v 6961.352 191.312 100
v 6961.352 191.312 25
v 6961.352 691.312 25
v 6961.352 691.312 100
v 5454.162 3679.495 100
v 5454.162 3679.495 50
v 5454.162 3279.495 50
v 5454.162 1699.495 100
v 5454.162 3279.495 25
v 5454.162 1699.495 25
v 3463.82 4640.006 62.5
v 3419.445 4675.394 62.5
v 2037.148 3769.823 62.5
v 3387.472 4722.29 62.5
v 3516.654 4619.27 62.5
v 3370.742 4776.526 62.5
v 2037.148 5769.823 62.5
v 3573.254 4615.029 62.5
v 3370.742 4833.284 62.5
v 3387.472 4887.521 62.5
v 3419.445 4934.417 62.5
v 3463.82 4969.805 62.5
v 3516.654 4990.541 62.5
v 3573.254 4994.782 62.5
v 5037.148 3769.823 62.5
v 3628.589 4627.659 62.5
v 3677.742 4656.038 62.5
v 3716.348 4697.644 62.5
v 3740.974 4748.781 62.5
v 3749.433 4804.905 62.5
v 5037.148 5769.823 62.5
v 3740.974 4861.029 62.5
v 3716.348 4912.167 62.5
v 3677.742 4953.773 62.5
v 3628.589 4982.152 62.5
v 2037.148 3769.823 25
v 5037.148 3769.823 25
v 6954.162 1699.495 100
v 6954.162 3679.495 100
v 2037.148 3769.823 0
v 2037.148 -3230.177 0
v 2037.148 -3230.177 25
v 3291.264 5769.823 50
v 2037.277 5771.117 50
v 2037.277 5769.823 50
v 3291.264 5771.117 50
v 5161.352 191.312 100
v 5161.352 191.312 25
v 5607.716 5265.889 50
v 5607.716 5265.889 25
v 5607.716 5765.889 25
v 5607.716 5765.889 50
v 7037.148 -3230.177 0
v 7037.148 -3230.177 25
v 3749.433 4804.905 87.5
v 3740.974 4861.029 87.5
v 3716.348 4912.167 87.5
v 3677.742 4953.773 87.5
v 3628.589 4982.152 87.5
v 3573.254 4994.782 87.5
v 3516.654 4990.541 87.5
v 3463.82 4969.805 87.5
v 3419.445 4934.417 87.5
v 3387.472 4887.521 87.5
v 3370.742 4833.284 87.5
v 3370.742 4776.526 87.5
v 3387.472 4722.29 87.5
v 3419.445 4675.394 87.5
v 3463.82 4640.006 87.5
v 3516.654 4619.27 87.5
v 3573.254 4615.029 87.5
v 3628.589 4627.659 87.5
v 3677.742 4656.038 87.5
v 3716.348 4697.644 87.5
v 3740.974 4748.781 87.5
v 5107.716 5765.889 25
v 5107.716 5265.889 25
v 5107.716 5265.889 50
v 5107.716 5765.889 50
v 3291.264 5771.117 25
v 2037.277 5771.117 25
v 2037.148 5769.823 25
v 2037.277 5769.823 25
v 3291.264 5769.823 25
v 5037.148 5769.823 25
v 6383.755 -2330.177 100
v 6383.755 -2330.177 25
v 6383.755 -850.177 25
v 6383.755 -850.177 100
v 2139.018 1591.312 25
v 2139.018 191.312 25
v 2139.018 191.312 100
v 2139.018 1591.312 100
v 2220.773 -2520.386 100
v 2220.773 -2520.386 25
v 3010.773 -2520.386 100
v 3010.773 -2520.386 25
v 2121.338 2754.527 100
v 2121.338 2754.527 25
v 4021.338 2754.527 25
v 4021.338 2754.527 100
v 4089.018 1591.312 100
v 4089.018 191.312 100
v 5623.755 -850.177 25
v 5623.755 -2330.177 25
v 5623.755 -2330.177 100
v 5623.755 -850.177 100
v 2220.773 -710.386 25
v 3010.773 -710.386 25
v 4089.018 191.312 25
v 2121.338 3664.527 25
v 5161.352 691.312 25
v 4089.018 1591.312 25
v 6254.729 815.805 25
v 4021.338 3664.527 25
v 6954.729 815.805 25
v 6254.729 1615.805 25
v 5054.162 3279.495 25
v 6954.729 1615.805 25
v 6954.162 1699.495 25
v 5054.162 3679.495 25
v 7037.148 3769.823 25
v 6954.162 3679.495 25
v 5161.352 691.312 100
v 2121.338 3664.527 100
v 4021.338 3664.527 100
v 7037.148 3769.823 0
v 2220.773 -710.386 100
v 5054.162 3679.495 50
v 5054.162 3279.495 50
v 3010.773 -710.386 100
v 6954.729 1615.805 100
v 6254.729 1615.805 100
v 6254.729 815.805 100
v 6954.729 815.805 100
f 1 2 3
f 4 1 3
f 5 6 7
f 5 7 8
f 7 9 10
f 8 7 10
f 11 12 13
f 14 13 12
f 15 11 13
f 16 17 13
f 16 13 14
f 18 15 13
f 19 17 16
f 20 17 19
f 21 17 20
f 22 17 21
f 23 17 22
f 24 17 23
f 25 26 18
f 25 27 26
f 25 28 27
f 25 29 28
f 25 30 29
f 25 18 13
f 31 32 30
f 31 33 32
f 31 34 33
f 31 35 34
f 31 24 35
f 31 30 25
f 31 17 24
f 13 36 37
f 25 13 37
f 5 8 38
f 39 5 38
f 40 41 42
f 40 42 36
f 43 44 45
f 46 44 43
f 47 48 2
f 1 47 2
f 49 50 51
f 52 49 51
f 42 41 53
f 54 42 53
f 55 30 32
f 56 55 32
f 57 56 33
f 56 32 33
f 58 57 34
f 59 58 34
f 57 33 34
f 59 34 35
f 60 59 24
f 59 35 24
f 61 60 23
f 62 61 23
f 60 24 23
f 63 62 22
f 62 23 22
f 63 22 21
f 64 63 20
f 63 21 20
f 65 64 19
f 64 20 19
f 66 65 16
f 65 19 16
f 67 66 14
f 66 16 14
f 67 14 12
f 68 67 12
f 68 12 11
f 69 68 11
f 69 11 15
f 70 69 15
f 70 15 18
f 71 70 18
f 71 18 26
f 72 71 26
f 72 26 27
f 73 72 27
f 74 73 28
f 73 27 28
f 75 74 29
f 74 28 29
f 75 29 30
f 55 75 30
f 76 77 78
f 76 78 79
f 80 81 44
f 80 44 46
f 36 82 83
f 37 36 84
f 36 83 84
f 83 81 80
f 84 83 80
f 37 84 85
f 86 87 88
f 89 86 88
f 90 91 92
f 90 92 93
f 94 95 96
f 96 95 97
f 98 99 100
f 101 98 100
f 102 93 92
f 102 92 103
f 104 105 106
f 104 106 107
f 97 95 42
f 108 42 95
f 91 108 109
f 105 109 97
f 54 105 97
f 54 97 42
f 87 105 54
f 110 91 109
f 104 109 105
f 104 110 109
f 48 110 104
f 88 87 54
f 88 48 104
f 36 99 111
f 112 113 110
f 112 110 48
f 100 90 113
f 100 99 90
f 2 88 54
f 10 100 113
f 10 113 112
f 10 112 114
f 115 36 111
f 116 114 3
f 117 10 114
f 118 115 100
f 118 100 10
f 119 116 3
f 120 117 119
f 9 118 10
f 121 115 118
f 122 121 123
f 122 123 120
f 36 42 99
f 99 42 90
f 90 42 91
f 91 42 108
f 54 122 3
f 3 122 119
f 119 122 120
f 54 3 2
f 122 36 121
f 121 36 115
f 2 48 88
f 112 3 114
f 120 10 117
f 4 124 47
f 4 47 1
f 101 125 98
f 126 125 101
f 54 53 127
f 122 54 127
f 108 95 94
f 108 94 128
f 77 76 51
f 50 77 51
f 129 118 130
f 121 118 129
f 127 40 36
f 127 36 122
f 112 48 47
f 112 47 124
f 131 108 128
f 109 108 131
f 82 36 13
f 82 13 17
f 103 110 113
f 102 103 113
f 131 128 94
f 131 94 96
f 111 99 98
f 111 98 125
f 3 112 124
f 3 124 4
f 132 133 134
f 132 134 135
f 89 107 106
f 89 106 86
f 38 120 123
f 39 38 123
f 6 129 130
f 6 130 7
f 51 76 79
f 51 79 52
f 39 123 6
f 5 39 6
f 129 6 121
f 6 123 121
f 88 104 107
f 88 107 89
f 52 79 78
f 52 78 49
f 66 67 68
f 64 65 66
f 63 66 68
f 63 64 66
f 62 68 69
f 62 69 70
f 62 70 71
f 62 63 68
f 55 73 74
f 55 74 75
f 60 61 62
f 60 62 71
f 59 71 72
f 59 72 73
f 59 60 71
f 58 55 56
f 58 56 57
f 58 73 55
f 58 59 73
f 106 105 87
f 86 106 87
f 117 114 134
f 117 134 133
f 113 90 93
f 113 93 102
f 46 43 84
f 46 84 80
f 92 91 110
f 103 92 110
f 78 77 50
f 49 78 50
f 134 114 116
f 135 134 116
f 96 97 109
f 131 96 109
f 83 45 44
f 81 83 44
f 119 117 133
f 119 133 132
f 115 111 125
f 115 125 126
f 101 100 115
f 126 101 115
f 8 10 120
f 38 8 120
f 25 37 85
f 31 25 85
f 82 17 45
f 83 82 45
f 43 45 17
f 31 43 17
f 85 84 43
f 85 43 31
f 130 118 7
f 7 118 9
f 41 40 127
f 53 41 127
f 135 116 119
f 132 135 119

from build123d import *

# Parameters (mm, degrees)
F0_W       = 5000
F0_H       = 7000
F0_W_2     = 790
F0_H_2     = 1810
F0_W_3     = 760
F0_H_3     = 1480
F0_W_4     = 1950
F0_H_4     = 1400
F0_W_5     = 1900
F0_H_5     = 910
F0_W_6     = 1800
F0_H_6     = 500
F0_W_7     = 700
F0_H_7     = 800
F1_DEPTH   = 25
F2_DEPTH   = 100
F3_DEPTH   = 100
F0_W_8     = 400
F0_H_8     = 400
F4_DEPTH   = 50
F5_DEPTH   = 100
F6_DEPTH   = 100
F7_DEPTH   = 100
F8_DEPTH   = 100
F9_DEPTH   = 100
F10_W      = 3000
F10_H      = 2000
F13_DEPTH  = 12.5
F11_W      = 500
F11_H      = 500
F14_DEPTH  = 25
F12_R      = 126.5540122986
F12_W      = 1253.9870738983
F12_H      = 1031.8846702576
F12_W_2    = 497.074842453
F12_H_2    = 817.5168037415
F13_FACE_W = 3000
F13_FACE_H = 2000
F15_DEPTH  = 25
F16_R      = 190.4091259928
F17_DEPTH  = 25


with BuildPart() as f1:
    # F0 (on Top) → F1 (new body)
    with BuildSketch(Plane.XY):
        with Locations((4537.1482372284, 269.8234380165)):
            Rectangle(F0_W, F0_H)
        with Locations((2615.7725048065, -1615.3859186172)):
            Rectangle(F0_W_2, F0_H_2, mode=Mode.SUBTRACT)
        with Locations((6003.7550878525, -1590.1765619835)):
            Rectangle(F0_W_3, F0_H_3, mode=Mode.SUBTRACT)
        with Locations((3114.0183746815, 891.3115263859)):
            Rectangle(F0_W_4, F0_H_4, mode=Mode.SUBTRACT)
        with Locations((3071.3378071785, 3209.5271874348)):
            Rectangle(F0_W_5, F0_H_5, mode=Mode.SUBTRACT)
        with Locations((6061.3521099091, 441.3115263859)):
            Rectangle(F0_W_6, F0_H_6, mode=Mode.SUBTRACT)
        with Locations((6604.7293186188, 1215.8045292774)):
            Rectangle(F0_W_7, F0_H_7, mode=Mode.SUBTRACT)
        Polygon((5054.1623592377, 3679.4947148243), (5454.1623592377, 3679.4947148243), (6954.1623592377, 3679.4947148243), (6954.1623592377, 1699.4947148243), (5454.1623592377, 1699.4947148243), (5454.1623592377, 3279.4947148243), (5054.1623592377, 3279.4947148243), align=None, mode=Mode.SUBTRACT)
    extrude(amount=F1_DEPTH)

    # F0 (on Top) → F2 (join)
    with BuildSketch(Plane.XY):
        with Locations((3071.3378071785, 3209.5271874348)):
            Rectangle(F0_W_5, F0_H_5)
    extrude(amount=F2_DEPTH)

    # F0 (on Top) → F3 (join)
    with BuildSketch(Plane.XY):
        with Locations((3114.0183746815, 891.3115263859)):
            Rectangle(F0_W_4, F0_H_4)
    extrude(amount=F3_DEPTH)

    # F0 (on Top) → F4 (join)
    with BuildSketch(Plane.XY):
        with Locations((5254.1623592377, 3479.4947148243)):
            Rectangle(F0_W_8, F0_H_8)
    extrude(amount=F4_DEPTH)

    # F0 (on Top) → F5 (join)
    with BuildSketch(Plane.XY):
        Polygon((6954.1623592377, 3679.4947148243), (5454.1623592377, 3679.4947148243), (5454.1623592377, 3279.4947148243), (5454.1623592377, 1699.4947148243), (6954.1623592377, 1699.4947148243), align=None)
    extrude(amount=F5_DEPTH)

    # F0 (on Top) → F6 (join)
    with BuildSketch(Plane.XY):
        with Locations((6604.7293186188, 1215.8045292774)):
            Rectangle(F0_W_7, F0_H_7)
    extrude(amount=F6_DEPTH)

    # F0 (on Top) → F7 (join)
    with BuildSketch(Plane.XY):
        with Locations((6061.3521099091, 441.3115263859)):
            Rectangle(F0_W_6, F0_H_6)
    extrude(amount=F7_DEPTH)

    # F0 (on Top) → F8 (join)
    with BuildSketch(Plane.XY):
        with Locations((6003.7550878525, -1590.1765619835)):
            Rectangle(F0_W_3, F0_H_3)
    extrude(amount=F8_DEPTH)

    # F0 (on Top) → F9 (join)
    with BuildSketch(Plane.XY):
        with Locations((2615.7725048065, -1615.3859186172)):
            Rectangle(F0_W_2, F0_H_2)
    extrude(amount=F9_DEPTH)


with BuildPart() as f13:
    # F10 (on face) → F13 (new body)
    with BuildSketch(Plane.XY.offset(25)):
        with Locations((3537.1482372284, 4769.8234380165)):
            Rectangle(F10_W, F10_H)
    extrude(amount=F13_DEPTH)

    # F12 (on face) + F13_face (on face) → F15 (join)
    with BuildSketch(Plane.XY.offset(25)):
        with Locations((3561.7125034332, 4791.14818573)):
            Circle(F12_R)
        with Locations((2664.2705202103, 5255.1743984222)):
            Rectangle(F12_W, F12_H)
        with Locations((2285.8144044876, 4188.7857913971)):
            Rectangle(F12_W_2, F12_H_2)
        Polygon((5035.0966453552, 5159.3179702759), (5035.0966453552, 5628.8223266602), (4785.4528427124, 5628.8223266602), (4785.4528427124, 5567.0471191406), (4785.4528427124, 5230.0539016724), (4785.4528427124, 5159.3179702759), align=None)
        with BuildLine():
            Line((4785.4528427124, 5230.0539016724), (4785.4528427124, 5567.0471191406))
            ThreePointArc((4785.4528427124, 5567.0471191406), (4531.6836768333, 5398.5505104065), (4785.4528427124, 5230.0539016724))
        make_face()
    with BuildSketch(Plane(origin=(3537.1482372284, 4769.8234380165, 37.5), x_dir=(1, 0, 0), z_dir=(0, 0, 1))):
        Rectangle(F13_FACE_W, F13_FACE_H)
    extrude(amount=F15_DEPTH)

    # F16 (on face) → F17 (join)
    with BuildSketch(Plane.XY.offset(62.5)):
        with Locations((3559.0243339539, 4804.9054145813)):
            Circle(F16_R)
    extrude(amount=F17_DEPTH)


with BuildPart() as f14:
    # F11 (on face) → F14 (new body)
    with BuildSketch(Plane.XY.offset(25)):
        with Locations((5357.7156066895, 5515.8891677856)):
            Rectangle(F11_W, F11_H)
    extrude(amount=F14_DEPTH)


solid = Compound([f1.part, f13.part, f14.part])
